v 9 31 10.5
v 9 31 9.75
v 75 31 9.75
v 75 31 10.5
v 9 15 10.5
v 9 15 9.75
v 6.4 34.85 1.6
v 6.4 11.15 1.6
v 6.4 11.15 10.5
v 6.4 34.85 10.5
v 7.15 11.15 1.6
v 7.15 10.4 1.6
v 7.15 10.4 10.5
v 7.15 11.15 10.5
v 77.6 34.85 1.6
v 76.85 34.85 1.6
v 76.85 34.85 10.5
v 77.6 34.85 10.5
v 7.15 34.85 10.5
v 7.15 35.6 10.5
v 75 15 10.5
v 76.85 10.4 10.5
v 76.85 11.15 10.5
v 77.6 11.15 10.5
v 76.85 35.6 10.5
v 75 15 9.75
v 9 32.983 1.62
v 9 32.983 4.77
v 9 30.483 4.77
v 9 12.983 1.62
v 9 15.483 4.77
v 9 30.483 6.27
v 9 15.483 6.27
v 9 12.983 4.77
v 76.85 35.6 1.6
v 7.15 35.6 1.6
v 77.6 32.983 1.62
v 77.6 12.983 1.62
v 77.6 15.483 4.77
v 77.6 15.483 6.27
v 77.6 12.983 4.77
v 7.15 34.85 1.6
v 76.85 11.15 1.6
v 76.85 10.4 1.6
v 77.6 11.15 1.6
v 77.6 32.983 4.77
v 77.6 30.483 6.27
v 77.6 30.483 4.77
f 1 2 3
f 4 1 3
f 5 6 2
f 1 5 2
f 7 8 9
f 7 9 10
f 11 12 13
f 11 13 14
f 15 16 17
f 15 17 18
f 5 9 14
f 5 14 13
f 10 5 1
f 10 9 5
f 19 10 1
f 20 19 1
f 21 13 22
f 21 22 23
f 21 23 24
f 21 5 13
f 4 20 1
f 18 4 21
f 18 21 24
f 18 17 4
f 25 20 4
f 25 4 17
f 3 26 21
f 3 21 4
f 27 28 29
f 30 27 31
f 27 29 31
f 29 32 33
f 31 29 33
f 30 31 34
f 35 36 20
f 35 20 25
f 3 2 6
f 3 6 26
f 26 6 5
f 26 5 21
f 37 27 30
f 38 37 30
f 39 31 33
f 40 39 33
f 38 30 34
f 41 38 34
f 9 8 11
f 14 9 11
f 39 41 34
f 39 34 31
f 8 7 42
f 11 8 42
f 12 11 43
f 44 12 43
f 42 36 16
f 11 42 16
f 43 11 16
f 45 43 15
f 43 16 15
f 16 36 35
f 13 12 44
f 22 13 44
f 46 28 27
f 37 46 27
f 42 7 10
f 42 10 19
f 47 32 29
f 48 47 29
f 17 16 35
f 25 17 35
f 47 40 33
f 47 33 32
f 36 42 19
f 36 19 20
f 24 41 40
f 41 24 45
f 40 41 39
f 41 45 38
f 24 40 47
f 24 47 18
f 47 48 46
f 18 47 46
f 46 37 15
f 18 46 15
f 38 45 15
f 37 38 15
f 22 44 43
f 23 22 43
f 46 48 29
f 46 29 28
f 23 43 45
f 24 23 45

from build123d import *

# Parameters (mm, degrees)
PAD002_DEPTH     = 75
BOX011_W         = 66
BOX011_H         = 16
BOX011_DEPTH     = 0.75
BOX010_W         = 0.75
BOX010_H         = 0.75
BOX010_DEPTH     = 9
ARRAY007_X_COUNT = 2
ARRAY007_X_PITCH = 70.45
ARRAY007_Y_COUNT = 2
ARRAY007_Y_PITCH = 24.45
BOX009_W         = 71.2
BOX009_H         = 25.2
BOX009_DEPTH     = 8.9


with BuildPart() as screen_lateral_hole:
    # Sketch002 → Pad002 (new body)
    with BuildSketch(Plane.YZ):
        Polygon((12.982779, 1.619702), (12.982779, 4.769702), (15.482779, 4.769702), (15.482779, 6.269702), (30.482779, 6.269702), (30.482779, 4.769702), (32.982779, 4.769702), (32.982779, 1.619702), align=None)
    extrude(amount=PAD002_DEPTH)


with BuildPart() as screen_lateral_hole_1:
    # Body002 placement: moved
    add(screen_lateral_hole.part.moved(Location((9, 0, 0))))


with BuildPart() as screen:
    # Box011 → Box011 (new body)
    with BuildSketch(Plane(origin=(9, 15, 9.75), x_dir=(1, 0, 0), z_dir=(0, 0, 1))):
        with Locations((33, 8)):
            Rectangle(BOX011_W, BOX011_H)
    extrude(amount=BOX011_DEPTH)


with BuildPart() as empy_spaces:
    # Box010 → Box010 (new body)
    with BuildSketch(Plane(origin=(6.4, 10.4, 1.6), x_dir=(1, 0, 0), z_dir=(0, 0, 1))):
        with Locations((0.375, 0.375)):
            Rectangle(BOX010_W, BOX010_H)
    extrude(amount=BOX010_DEPTH)

    # Array007 X: Empy Spaces ×2


with BuildPart() as empy_spaces_1:
    add(empy_spaces.part)
    with Locations(*[(i * ARRAY007_X_PITCH, 0, 0) for i in range(1, ARRAY007_X_COUNT)]):
        add(empy_spaces.part)

    # Array007 Y: Empy Spaces ×2


with BuildPart() as empy_spaces_2:
    add(empy_spaces_1.part)
    with Locations(*[(0, i * ARRAY007_Y_PITCH, 0) for i in range(1, ARRAY007_Y_COUNT)]):
        add(empy_spaces_1.part)

    # Fusion002004: union Screen Lateral Hole, Screen
    add(screen_lateral_hole_1.part)
    add(screen.part)


with BuildPart() as panel:
    # Box009 → Box009 (new body)
    with BuildSketch(Plane(origin=(6.4, 10.4, 1.6), x_dir=(1, 0, 0), z_dir=(0, 0, 1))):
        with Locations((35.6, 12.6)):
            Rectangle(BOX009_W, BOX009_H)
    extrude(amount=BOX009_DEPTH)

    # Cut001: cut Empy Spaces
    add(empy_spaces_2.part, mode=Mode.SUBTRACT)


solid = panel.part
